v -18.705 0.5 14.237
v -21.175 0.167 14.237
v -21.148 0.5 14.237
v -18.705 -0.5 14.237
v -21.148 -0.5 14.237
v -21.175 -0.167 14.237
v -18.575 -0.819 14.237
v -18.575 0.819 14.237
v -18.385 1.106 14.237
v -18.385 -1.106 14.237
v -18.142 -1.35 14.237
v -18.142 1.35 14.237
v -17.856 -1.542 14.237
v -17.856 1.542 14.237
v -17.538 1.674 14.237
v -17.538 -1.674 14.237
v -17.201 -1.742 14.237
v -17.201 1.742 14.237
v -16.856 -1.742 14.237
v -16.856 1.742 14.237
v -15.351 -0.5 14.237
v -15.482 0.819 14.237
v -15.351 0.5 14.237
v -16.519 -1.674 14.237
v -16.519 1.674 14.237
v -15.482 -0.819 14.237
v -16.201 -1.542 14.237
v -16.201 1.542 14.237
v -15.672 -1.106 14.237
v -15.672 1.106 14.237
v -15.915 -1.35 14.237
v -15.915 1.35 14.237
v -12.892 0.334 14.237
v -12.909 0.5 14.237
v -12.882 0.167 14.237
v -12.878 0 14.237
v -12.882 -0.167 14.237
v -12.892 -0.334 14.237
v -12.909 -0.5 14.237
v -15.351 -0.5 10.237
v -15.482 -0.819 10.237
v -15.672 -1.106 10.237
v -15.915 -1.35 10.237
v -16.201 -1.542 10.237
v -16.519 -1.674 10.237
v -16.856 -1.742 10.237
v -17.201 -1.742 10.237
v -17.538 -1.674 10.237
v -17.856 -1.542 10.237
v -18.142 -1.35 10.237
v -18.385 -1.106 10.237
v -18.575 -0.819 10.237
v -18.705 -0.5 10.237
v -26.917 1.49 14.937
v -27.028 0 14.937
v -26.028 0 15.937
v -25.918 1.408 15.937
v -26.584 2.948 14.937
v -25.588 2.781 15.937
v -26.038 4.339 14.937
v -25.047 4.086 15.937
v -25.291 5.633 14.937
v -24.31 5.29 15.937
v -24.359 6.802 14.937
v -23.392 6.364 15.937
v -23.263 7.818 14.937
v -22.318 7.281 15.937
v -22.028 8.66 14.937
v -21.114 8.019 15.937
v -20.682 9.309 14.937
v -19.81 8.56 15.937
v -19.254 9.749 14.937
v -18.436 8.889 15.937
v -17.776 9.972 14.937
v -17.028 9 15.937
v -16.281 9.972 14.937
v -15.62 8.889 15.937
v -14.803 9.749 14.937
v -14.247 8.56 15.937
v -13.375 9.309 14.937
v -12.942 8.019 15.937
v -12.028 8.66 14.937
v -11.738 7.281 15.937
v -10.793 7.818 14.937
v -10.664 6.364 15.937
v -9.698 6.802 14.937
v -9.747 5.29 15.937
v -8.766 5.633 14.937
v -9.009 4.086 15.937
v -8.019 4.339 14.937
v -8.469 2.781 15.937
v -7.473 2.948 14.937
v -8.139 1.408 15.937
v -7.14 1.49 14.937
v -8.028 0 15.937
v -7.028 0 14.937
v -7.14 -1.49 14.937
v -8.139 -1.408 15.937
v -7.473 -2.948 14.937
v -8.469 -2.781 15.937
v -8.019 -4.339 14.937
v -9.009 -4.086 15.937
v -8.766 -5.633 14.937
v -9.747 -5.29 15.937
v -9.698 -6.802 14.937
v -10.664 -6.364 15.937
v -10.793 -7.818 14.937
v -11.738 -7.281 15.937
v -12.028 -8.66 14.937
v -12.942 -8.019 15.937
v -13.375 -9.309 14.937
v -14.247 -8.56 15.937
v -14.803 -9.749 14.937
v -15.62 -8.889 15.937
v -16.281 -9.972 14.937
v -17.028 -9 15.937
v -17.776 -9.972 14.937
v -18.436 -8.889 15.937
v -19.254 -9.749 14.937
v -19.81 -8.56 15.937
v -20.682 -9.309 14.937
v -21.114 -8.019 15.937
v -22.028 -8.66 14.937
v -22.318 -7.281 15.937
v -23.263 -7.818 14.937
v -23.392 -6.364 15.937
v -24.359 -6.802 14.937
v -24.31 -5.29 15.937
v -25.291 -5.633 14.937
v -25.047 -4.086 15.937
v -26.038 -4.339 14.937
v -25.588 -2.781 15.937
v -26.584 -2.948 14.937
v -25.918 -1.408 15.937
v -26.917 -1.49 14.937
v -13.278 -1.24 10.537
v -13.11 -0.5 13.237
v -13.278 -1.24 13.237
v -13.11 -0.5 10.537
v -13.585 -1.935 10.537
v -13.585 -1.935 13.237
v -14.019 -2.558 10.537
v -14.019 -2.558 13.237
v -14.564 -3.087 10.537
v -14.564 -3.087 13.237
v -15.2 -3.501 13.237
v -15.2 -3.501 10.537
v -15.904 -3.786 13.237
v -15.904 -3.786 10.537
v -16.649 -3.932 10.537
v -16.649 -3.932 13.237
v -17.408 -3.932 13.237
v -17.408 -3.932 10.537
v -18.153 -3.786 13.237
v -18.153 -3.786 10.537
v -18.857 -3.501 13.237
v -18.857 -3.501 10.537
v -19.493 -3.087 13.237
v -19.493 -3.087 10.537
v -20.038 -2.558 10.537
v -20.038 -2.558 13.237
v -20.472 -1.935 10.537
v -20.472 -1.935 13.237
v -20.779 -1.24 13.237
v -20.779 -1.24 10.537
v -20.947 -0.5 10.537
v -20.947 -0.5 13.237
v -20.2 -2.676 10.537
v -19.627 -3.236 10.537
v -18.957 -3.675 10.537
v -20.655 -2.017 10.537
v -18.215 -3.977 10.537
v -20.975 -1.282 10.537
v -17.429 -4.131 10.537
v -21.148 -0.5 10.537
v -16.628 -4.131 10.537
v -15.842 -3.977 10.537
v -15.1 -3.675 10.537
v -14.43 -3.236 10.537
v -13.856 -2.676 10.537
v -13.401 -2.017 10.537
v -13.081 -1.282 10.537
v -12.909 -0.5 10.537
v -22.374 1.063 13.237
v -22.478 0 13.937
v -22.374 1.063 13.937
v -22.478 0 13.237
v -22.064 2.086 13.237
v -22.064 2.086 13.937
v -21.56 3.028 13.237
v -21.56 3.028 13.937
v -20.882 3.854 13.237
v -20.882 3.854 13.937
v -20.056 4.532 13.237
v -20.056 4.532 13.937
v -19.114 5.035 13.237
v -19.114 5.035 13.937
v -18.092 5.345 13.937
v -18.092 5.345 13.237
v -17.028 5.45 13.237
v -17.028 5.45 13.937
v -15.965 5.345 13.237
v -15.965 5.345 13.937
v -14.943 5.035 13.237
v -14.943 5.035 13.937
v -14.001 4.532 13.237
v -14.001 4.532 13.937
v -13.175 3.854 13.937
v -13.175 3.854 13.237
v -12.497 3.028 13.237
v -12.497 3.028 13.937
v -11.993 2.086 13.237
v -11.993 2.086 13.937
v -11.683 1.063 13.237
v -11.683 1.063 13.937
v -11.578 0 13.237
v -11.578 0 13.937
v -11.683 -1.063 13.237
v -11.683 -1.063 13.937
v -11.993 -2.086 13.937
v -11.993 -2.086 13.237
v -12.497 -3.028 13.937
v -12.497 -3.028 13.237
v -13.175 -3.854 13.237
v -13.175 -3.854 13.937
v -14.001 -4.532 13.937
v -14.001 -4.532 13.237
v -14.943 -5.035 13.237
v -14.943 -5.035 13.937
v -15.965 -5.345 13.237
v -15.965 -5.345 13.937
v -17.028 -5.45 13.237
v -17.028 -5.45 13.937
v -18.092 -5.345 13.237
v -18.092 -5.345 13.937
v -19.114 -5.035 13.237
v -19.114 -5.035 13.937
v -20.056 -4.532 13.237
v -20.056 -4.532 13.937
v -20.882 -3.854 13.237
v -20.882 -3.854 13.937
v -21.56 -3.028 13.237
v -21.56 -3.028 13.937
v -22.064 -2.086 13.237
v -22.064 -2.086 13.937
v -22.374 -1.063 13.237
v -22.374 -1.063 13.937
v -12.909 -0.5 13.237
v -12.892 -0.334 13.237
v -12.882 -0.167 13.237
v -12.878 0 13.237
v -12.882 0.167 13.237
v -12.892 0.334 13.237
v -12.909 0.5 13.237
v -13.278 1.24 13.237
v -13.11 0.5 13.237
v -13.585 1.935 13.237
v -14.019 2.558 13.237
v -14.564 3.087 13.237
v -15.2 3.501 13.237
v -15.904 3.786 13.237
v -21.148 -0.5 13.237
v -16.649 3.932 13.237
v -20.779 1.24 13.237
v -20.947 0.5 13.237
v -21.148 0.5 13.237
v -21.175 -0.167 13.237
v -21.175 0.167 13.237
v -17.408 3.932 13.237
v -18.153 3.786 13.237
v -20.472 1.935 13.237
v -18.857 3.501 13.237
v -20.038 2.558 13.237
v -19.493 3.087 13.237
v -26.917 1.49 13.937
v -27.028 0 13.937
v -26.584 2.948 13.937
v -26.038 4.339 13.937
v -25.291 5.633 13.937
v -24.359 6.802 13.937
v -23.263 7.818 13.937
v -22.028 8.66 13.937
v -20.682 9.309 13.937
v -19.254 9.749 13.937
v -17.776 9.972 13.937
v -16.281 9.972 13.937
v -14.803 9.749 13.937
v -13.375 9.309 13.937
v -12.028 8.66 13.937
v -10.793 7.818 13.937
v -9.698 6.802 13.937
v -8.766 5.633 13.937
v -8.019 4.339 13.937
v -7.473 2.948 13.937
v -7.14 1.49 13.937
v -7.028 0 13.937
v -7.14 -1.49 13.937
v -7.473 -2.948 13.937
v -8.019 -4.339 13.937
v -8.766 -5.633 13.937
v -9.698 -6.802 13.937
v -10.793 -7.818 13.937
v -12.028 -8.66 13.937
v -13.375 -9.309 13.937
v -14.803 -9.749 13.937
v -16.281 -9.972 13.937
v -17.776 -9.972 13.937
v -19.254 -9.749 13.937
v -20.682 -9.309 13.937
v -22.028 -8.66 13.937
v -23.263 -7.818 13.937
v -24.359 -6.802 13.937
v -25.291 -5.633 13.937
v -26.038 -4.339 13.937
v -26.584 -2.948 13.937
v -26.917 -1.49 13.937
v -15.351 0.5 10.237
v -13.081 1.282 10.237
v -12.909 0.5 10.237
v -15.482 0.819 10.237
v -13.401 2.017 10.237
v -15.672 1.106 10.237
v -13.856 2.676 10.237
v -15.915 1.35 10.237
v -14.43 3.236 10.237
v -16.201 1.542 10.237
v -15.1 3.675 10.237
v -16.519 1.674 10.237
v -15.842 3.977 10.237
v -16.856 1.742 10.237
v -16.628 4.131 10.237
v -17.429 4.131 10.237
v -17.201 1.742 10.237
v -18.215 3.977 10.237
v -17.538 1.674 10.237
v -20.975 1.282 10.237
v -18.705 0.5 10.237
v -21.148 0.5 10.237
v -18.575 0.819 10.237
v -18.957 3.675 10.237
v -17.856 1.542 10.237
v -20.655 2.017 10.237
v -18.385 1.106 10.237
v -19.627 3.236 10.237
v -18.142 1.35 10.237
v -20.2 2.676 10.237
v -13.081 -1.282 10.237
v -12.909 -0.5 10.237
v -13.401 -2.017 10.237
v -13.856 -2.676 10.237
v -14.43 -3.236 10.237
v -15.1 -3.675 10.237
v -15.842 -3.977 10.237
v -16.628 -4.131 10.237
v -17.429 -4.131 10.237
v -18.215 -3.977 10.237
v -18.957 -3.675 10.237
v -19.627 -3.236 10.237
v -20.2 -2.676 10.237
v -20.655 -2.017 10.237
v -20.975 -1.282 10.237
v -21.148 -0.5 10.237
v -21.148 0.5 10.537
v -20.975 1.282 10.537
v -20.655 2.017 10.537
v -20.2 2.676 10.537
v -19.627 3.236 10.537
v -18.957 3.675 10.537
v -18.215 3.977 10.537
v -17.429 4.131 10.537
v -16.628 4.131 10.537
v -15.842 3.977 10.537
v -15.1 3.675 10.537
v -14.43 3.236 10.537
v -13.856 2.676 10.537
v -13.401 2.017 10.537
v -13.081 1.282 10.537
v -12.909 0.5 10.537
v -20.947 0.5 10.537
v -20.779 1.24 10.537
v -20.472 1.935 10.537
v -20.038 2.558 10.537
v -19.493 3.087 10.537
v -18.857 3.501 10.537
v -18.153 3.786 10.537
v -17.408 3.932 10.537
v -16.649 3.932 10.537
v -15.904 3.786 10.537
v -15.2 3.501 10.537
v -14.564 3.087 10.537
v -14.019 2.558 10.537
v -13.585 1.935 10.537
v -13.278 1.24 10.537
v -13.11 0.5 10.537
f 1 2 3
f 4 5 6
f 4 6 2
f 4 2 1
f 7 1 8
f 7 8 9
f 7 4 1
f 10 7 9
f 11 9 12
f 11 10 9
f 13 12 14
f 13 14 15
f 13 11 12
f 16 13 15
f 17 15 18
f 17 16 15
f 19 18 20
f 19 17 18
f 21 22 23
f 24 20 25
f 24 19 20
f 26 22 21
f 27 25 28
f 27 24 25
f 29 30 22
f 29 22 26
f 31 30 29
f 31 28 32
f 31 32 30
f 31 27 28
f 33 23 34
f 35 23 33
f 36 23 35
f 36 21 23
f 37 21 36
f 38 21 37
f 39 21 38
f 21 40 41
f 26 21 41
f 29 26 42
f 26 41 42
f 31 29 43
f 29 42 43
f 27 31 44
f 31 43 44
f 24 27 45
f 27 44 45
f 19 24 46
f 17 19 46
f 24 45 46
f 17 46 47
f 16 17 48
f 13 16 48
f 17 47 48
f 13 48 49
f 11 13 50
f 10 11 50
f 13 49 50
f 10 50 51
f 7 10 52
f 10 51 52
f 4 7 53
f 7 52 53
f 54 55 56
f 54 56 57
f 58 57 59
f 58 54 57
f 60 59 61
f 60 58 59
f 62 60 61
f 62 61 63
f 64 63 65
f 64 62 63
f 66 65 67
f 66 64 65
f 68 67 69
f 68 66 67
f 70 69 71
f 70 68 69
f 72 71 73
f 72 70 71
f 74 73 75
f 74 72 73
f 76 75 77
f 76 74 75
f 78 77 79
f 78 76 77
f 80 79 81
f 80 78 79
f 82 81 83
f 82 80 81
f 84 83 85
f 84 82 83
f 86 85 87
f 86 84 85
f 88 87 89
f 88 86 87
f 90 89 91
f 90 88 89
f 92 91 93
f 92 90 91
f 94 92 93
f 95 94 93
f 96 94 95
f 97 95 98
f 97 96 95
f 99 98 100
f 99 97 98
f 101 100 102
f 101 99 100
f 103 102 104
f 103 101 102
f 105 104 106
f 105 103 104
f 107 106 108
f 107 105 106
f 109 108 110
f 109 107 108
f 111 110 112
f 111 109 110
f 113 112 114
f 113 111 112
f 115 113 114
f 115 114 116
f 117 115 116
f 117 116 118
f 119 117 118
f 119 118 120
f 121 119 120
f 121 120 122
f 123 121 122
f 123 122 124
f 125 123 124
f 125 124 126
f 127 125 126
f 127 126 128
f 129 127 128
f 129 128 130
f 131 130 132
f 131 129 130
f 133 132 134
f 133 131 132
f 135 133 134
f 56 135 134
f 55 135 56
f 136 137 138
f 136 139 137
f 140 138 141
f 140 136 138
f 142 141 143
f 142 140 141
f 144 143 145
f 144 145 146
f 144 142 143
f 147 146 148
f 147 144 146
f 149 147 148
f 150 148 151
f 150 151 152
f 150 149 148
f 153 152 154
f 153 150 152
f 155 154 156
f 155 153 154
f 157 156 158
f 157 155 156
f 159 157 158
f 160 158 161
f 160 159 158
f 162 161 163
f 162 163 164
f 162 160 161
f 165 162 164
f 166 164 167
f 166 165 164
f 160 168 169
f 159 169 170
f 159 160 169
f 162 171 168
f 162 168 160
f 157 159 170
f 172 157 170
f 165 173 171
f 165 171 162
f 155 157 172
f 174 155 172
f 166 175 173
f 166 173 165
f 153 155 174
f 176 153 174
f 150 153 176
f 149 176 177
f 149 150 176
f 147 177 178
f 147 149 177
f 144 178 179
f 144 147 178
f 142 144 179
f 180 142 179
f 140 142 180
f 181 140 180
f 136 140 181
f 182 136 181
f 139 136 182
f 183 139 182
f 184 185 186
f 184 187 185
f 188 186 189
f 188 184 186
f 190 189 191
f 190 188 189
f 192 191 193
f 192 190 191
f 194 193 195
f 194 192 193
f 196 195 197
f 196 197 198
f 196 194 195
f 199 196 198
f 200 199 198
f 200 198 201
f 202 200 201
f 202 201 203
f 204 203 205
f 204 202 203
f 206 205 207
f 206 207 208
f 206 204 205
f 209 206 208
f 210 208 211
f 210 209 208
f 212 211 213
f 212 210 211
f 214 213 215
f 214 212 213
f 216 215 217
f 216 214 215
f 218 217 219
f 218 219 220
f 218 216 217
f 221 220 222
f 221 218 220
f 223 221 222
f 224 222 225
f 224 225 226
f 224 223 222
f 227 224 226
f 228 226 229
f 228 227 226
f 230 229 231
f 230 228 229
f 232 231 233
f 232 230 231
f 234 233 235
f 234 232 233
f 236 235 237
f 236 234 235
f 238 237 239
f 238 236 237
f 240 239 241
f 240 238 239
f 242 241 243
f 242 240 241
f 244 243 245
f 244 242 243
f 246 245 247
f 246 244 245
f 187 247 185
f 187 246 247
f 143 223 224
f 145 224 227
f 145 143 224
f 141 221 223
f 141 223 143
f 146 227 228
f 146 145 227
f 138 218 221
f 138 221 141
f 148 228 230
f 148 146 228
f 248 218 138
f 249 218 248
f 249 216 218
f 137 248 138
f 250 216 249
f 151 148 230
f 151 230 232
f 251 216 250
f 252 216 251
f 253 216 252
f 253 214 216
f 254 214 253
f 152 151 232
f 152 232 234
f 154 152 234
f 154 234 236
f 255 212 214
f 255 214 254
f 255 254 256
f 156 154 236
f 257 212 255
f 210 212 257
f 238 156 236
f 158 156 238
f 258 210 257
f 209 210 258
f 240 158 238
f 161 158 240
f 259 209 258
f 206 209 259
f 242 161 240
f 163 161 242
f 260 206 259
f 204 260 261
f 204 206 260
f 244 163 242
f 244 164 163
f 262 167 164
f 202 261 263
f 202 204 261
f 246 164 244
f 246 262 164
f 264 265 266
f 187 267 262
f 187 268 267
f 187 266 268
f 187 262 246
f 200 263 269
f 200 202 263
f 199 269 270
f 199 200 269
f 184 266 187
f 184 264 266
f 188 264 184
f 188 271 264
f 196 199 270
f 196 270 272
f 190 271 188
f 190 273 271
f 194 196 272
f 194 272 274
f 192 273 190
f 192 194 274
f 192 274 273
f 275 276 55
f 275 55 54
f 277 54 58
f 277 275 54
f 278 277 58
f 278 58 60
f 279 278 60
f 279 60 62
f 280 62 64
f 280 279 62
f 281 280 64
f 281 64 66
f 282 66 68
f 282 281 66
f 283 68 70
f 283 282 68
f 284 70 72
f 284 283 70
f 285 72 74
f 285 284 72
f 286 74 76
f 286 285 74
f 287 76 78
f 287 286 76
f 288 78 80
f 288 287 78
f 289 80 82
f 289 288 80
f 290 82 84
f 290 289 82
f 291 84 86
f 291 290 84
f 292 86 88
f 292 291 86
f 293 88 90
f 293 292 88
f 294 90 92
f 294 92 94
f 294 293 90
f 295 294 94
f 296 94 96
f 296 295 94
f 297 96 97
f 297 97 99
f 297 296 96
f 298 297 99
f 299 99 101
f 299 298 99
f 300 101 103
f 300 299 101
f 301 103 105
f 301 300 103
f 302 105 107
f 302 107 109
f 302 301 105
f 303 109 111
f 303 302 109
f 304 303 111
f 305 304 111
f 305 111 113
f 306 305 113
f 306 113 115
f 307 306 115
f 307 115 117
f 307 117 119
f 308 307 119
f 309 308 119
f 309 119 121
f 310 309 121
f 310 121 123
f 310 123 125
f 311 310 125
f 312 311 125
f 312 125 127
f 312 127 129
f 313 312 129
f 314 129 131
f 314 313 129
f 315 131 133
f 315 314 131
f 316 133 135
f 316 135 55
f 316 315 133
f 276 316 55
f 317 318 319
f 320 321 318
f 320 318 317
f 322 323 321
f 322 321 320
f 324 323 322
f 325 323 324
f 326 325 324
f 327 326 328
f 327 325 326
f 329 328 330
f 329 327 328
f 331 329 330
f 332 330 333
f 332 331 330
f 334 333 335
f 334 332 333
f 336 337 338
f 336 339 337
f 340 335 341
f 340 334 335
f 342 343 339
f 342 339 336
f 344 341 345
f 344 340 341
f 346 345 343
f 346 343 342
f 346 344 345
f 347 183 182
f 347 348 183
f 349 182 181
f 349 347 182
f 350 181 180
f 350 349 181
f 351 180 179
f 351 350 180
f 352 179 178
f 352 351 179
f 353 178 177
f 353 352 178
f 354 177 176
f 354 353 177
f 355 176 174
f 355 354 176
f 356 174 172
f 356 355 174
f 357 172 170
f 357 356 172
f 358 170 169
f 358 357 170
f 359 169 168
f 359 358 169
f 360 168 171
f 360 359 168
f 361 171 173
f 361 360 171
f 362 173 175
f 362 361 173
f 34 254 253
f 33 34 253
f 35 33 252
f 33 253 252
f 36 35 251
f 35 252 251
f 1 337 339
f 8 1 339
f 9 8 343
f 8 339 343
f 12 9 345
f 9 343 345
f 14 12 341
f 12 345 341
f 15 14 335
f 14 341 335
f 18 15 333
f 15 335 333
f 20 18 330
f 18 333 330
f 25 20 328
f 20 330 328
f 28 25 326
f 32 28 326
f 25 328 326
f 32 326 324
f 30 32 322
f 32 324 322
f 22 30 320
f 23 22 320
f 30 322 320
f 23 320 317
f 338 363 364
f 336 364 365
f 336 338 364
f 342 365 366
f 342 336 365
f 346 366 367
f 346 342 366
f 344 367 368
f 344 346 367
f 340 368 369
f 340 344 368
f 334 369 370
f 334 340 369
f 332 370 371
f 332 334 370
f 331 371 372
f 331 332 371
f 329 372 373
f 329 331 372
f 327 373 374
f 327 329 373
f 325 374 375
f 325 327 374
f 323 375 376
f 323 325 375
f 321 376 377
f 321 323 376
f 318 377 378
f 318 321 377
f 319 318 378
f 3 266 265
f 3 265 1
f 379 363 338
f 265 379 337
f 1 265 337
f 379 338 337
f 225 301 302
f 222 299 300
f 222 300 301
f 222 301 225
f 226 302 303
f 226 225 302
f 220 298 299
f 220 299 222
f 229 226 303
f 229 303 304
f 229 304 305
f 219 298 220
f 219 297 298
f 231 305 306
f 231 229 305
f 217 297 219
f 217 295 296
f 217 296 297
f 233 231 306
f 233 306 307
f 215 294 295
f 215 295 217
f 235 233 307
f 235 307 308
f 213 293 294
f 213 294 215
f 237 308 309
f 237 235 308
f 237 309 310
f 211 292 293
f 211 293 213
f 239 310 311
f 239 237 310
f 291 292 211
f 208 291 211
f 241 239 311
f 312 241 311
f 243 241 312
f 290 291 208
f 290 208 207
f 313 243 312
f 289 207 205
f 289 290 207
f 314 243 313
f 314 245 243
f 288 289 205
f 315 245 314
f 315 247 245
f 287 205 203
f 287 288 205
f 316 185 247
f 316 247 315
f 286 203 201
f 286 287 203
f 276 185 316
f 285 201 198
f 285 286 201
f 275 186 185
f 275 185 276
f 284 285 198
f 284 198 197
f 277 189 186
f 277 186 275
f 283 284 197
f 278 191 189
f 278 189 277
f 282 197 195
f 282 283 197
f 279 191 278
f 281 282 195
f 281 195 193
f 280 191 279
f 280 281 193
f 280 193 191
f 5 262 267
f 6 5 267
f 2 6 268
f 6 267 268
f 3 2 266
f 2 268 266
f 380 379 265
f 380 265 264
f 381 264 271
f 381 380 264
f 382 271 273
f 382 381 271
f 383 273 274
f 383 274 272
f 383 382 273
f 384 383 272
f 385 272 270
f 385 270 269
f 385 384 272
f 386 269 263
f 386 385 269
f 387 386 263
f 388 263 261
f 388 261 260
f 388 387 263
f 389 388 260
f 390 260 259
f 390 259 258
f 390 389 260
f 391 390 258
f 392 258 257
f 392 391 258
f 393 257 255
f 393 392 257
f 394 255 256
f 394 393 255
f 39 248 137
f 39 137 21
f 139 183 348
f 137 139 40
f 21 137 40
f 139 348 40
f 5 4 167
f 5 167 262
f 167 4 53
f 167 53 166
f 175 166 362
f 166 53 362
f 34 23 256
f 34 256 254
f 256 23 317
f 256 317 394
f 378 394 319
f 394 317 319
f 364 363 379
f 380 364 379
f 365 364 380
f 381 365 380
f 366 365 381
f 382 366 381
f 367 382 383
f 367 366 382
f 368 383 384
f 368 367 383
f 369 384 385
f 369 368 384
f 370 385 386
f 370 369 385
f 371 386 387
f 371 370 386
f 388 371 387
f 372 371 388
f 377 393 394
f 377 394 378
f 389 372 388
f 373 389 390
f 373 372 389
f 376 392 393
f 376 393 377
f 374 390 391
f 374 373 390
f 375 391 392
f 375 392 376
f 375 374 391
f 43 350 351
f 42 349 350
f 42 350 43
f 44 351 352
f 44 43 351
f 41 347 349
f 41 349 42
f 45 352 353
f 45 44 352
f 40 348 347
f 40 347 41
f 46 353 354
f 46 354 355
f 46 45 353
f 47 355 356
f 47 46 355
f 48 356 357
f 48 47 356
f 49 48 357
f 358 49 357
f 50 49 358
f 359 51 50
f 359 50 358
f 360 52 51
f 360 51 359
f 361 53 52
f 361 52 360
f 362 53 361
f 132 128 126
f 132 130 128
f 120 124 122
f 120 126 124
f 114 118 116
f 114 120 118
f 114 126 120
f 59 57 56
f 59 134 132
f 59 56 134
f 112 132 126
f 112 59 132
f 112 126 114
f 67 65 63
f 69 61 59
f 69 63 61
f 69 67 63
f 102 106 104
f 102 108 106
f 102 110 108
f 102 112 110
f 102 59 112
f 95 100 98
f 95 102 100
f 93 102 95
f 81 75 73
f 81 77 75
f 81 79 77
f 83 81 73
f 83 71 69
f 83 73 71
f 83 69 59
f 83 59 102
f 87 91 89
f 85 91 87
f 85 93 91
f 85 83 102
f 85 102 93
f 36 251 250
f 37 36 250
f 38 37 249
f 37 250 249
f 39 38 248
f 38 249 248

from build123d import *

# Parameters (mm, degrees)
F3_DEPTH = 4
F4_SIZE  = 1


with BuildPart() as f1:
    # F0 (on Front) → F1 (revolve)
    with BuildSketch(Plane.XZ):
        Polygon((-17.0283879898, 10.2372211188), (-17.0283879898, 15.9372211188), (-27.0283879898, 15.9372211188), (-27.0283879898, 13.9372211188), (-22.4783879898, 13.9372211188), (-22.4783879898, 13.2372211188), (-20.9783879898, 13.2372211188), (-20.9783879898, 10.5372211188), (-21.1783879898, 10.5372211188), (-21.1783879898, 10.2372211188), align=None)
    revolve(axis=Axis((-17.0283879898, 0, 13.0872211188), (0, 0, -1)))

    # F2 (on face) → F3 (cut)
    with BuildSketch(Plane(origin=(0, 0, 10.2372211188), x_dir=(1, 0, 0), z_dir=(0, 0, -1))):
        with BuildLine():
            Line((-21.1481574009, -0.5), (-18.705438973, -0.5))
            ThreePointArc((-18.705438973, -0.5), (-17.0283879898, -1.75), (-15.3513370067, -0.5))
            Line((-15.3513370067, -0.5), (-12.9086185788, -0.5))
            ThreePointArc((-12.9086185788, -0.5), (-12.8859525313, -0.2504565274), (-12.8783879898, 0))
            ThreePointArc((-12.8783879898, 0), (-12.8859525313, 0.2504565274), (-12.9086185788, 0.5))
            Line((-12.9086185788, 0.5), (-15.3513370067, 0.5))
            ThreePointArc((-15.3513370067, 0.5), (-17.0283879898, 1.75), (-18.705438973, 0.5))
            Line((-18.705438973, 0.5), (-21.1481574009, 0.5))
            ThreePointArc((-21.1481574009, 0.5), (-21.1783879898, 0), (-21.1481574009, -0.5))
        make_face()
    extrude(amount=-F3_DEPTH, mode=Mode.SUBTRACT)

    # F4
    f4_edges = [f1.edges().sort_by_distance(p)[0] for p in [
        (-7.028388, 0, 15.937221),
    ]]
    chamfer(f4_edges, length=F4_SIZE)


solid = f1.part
